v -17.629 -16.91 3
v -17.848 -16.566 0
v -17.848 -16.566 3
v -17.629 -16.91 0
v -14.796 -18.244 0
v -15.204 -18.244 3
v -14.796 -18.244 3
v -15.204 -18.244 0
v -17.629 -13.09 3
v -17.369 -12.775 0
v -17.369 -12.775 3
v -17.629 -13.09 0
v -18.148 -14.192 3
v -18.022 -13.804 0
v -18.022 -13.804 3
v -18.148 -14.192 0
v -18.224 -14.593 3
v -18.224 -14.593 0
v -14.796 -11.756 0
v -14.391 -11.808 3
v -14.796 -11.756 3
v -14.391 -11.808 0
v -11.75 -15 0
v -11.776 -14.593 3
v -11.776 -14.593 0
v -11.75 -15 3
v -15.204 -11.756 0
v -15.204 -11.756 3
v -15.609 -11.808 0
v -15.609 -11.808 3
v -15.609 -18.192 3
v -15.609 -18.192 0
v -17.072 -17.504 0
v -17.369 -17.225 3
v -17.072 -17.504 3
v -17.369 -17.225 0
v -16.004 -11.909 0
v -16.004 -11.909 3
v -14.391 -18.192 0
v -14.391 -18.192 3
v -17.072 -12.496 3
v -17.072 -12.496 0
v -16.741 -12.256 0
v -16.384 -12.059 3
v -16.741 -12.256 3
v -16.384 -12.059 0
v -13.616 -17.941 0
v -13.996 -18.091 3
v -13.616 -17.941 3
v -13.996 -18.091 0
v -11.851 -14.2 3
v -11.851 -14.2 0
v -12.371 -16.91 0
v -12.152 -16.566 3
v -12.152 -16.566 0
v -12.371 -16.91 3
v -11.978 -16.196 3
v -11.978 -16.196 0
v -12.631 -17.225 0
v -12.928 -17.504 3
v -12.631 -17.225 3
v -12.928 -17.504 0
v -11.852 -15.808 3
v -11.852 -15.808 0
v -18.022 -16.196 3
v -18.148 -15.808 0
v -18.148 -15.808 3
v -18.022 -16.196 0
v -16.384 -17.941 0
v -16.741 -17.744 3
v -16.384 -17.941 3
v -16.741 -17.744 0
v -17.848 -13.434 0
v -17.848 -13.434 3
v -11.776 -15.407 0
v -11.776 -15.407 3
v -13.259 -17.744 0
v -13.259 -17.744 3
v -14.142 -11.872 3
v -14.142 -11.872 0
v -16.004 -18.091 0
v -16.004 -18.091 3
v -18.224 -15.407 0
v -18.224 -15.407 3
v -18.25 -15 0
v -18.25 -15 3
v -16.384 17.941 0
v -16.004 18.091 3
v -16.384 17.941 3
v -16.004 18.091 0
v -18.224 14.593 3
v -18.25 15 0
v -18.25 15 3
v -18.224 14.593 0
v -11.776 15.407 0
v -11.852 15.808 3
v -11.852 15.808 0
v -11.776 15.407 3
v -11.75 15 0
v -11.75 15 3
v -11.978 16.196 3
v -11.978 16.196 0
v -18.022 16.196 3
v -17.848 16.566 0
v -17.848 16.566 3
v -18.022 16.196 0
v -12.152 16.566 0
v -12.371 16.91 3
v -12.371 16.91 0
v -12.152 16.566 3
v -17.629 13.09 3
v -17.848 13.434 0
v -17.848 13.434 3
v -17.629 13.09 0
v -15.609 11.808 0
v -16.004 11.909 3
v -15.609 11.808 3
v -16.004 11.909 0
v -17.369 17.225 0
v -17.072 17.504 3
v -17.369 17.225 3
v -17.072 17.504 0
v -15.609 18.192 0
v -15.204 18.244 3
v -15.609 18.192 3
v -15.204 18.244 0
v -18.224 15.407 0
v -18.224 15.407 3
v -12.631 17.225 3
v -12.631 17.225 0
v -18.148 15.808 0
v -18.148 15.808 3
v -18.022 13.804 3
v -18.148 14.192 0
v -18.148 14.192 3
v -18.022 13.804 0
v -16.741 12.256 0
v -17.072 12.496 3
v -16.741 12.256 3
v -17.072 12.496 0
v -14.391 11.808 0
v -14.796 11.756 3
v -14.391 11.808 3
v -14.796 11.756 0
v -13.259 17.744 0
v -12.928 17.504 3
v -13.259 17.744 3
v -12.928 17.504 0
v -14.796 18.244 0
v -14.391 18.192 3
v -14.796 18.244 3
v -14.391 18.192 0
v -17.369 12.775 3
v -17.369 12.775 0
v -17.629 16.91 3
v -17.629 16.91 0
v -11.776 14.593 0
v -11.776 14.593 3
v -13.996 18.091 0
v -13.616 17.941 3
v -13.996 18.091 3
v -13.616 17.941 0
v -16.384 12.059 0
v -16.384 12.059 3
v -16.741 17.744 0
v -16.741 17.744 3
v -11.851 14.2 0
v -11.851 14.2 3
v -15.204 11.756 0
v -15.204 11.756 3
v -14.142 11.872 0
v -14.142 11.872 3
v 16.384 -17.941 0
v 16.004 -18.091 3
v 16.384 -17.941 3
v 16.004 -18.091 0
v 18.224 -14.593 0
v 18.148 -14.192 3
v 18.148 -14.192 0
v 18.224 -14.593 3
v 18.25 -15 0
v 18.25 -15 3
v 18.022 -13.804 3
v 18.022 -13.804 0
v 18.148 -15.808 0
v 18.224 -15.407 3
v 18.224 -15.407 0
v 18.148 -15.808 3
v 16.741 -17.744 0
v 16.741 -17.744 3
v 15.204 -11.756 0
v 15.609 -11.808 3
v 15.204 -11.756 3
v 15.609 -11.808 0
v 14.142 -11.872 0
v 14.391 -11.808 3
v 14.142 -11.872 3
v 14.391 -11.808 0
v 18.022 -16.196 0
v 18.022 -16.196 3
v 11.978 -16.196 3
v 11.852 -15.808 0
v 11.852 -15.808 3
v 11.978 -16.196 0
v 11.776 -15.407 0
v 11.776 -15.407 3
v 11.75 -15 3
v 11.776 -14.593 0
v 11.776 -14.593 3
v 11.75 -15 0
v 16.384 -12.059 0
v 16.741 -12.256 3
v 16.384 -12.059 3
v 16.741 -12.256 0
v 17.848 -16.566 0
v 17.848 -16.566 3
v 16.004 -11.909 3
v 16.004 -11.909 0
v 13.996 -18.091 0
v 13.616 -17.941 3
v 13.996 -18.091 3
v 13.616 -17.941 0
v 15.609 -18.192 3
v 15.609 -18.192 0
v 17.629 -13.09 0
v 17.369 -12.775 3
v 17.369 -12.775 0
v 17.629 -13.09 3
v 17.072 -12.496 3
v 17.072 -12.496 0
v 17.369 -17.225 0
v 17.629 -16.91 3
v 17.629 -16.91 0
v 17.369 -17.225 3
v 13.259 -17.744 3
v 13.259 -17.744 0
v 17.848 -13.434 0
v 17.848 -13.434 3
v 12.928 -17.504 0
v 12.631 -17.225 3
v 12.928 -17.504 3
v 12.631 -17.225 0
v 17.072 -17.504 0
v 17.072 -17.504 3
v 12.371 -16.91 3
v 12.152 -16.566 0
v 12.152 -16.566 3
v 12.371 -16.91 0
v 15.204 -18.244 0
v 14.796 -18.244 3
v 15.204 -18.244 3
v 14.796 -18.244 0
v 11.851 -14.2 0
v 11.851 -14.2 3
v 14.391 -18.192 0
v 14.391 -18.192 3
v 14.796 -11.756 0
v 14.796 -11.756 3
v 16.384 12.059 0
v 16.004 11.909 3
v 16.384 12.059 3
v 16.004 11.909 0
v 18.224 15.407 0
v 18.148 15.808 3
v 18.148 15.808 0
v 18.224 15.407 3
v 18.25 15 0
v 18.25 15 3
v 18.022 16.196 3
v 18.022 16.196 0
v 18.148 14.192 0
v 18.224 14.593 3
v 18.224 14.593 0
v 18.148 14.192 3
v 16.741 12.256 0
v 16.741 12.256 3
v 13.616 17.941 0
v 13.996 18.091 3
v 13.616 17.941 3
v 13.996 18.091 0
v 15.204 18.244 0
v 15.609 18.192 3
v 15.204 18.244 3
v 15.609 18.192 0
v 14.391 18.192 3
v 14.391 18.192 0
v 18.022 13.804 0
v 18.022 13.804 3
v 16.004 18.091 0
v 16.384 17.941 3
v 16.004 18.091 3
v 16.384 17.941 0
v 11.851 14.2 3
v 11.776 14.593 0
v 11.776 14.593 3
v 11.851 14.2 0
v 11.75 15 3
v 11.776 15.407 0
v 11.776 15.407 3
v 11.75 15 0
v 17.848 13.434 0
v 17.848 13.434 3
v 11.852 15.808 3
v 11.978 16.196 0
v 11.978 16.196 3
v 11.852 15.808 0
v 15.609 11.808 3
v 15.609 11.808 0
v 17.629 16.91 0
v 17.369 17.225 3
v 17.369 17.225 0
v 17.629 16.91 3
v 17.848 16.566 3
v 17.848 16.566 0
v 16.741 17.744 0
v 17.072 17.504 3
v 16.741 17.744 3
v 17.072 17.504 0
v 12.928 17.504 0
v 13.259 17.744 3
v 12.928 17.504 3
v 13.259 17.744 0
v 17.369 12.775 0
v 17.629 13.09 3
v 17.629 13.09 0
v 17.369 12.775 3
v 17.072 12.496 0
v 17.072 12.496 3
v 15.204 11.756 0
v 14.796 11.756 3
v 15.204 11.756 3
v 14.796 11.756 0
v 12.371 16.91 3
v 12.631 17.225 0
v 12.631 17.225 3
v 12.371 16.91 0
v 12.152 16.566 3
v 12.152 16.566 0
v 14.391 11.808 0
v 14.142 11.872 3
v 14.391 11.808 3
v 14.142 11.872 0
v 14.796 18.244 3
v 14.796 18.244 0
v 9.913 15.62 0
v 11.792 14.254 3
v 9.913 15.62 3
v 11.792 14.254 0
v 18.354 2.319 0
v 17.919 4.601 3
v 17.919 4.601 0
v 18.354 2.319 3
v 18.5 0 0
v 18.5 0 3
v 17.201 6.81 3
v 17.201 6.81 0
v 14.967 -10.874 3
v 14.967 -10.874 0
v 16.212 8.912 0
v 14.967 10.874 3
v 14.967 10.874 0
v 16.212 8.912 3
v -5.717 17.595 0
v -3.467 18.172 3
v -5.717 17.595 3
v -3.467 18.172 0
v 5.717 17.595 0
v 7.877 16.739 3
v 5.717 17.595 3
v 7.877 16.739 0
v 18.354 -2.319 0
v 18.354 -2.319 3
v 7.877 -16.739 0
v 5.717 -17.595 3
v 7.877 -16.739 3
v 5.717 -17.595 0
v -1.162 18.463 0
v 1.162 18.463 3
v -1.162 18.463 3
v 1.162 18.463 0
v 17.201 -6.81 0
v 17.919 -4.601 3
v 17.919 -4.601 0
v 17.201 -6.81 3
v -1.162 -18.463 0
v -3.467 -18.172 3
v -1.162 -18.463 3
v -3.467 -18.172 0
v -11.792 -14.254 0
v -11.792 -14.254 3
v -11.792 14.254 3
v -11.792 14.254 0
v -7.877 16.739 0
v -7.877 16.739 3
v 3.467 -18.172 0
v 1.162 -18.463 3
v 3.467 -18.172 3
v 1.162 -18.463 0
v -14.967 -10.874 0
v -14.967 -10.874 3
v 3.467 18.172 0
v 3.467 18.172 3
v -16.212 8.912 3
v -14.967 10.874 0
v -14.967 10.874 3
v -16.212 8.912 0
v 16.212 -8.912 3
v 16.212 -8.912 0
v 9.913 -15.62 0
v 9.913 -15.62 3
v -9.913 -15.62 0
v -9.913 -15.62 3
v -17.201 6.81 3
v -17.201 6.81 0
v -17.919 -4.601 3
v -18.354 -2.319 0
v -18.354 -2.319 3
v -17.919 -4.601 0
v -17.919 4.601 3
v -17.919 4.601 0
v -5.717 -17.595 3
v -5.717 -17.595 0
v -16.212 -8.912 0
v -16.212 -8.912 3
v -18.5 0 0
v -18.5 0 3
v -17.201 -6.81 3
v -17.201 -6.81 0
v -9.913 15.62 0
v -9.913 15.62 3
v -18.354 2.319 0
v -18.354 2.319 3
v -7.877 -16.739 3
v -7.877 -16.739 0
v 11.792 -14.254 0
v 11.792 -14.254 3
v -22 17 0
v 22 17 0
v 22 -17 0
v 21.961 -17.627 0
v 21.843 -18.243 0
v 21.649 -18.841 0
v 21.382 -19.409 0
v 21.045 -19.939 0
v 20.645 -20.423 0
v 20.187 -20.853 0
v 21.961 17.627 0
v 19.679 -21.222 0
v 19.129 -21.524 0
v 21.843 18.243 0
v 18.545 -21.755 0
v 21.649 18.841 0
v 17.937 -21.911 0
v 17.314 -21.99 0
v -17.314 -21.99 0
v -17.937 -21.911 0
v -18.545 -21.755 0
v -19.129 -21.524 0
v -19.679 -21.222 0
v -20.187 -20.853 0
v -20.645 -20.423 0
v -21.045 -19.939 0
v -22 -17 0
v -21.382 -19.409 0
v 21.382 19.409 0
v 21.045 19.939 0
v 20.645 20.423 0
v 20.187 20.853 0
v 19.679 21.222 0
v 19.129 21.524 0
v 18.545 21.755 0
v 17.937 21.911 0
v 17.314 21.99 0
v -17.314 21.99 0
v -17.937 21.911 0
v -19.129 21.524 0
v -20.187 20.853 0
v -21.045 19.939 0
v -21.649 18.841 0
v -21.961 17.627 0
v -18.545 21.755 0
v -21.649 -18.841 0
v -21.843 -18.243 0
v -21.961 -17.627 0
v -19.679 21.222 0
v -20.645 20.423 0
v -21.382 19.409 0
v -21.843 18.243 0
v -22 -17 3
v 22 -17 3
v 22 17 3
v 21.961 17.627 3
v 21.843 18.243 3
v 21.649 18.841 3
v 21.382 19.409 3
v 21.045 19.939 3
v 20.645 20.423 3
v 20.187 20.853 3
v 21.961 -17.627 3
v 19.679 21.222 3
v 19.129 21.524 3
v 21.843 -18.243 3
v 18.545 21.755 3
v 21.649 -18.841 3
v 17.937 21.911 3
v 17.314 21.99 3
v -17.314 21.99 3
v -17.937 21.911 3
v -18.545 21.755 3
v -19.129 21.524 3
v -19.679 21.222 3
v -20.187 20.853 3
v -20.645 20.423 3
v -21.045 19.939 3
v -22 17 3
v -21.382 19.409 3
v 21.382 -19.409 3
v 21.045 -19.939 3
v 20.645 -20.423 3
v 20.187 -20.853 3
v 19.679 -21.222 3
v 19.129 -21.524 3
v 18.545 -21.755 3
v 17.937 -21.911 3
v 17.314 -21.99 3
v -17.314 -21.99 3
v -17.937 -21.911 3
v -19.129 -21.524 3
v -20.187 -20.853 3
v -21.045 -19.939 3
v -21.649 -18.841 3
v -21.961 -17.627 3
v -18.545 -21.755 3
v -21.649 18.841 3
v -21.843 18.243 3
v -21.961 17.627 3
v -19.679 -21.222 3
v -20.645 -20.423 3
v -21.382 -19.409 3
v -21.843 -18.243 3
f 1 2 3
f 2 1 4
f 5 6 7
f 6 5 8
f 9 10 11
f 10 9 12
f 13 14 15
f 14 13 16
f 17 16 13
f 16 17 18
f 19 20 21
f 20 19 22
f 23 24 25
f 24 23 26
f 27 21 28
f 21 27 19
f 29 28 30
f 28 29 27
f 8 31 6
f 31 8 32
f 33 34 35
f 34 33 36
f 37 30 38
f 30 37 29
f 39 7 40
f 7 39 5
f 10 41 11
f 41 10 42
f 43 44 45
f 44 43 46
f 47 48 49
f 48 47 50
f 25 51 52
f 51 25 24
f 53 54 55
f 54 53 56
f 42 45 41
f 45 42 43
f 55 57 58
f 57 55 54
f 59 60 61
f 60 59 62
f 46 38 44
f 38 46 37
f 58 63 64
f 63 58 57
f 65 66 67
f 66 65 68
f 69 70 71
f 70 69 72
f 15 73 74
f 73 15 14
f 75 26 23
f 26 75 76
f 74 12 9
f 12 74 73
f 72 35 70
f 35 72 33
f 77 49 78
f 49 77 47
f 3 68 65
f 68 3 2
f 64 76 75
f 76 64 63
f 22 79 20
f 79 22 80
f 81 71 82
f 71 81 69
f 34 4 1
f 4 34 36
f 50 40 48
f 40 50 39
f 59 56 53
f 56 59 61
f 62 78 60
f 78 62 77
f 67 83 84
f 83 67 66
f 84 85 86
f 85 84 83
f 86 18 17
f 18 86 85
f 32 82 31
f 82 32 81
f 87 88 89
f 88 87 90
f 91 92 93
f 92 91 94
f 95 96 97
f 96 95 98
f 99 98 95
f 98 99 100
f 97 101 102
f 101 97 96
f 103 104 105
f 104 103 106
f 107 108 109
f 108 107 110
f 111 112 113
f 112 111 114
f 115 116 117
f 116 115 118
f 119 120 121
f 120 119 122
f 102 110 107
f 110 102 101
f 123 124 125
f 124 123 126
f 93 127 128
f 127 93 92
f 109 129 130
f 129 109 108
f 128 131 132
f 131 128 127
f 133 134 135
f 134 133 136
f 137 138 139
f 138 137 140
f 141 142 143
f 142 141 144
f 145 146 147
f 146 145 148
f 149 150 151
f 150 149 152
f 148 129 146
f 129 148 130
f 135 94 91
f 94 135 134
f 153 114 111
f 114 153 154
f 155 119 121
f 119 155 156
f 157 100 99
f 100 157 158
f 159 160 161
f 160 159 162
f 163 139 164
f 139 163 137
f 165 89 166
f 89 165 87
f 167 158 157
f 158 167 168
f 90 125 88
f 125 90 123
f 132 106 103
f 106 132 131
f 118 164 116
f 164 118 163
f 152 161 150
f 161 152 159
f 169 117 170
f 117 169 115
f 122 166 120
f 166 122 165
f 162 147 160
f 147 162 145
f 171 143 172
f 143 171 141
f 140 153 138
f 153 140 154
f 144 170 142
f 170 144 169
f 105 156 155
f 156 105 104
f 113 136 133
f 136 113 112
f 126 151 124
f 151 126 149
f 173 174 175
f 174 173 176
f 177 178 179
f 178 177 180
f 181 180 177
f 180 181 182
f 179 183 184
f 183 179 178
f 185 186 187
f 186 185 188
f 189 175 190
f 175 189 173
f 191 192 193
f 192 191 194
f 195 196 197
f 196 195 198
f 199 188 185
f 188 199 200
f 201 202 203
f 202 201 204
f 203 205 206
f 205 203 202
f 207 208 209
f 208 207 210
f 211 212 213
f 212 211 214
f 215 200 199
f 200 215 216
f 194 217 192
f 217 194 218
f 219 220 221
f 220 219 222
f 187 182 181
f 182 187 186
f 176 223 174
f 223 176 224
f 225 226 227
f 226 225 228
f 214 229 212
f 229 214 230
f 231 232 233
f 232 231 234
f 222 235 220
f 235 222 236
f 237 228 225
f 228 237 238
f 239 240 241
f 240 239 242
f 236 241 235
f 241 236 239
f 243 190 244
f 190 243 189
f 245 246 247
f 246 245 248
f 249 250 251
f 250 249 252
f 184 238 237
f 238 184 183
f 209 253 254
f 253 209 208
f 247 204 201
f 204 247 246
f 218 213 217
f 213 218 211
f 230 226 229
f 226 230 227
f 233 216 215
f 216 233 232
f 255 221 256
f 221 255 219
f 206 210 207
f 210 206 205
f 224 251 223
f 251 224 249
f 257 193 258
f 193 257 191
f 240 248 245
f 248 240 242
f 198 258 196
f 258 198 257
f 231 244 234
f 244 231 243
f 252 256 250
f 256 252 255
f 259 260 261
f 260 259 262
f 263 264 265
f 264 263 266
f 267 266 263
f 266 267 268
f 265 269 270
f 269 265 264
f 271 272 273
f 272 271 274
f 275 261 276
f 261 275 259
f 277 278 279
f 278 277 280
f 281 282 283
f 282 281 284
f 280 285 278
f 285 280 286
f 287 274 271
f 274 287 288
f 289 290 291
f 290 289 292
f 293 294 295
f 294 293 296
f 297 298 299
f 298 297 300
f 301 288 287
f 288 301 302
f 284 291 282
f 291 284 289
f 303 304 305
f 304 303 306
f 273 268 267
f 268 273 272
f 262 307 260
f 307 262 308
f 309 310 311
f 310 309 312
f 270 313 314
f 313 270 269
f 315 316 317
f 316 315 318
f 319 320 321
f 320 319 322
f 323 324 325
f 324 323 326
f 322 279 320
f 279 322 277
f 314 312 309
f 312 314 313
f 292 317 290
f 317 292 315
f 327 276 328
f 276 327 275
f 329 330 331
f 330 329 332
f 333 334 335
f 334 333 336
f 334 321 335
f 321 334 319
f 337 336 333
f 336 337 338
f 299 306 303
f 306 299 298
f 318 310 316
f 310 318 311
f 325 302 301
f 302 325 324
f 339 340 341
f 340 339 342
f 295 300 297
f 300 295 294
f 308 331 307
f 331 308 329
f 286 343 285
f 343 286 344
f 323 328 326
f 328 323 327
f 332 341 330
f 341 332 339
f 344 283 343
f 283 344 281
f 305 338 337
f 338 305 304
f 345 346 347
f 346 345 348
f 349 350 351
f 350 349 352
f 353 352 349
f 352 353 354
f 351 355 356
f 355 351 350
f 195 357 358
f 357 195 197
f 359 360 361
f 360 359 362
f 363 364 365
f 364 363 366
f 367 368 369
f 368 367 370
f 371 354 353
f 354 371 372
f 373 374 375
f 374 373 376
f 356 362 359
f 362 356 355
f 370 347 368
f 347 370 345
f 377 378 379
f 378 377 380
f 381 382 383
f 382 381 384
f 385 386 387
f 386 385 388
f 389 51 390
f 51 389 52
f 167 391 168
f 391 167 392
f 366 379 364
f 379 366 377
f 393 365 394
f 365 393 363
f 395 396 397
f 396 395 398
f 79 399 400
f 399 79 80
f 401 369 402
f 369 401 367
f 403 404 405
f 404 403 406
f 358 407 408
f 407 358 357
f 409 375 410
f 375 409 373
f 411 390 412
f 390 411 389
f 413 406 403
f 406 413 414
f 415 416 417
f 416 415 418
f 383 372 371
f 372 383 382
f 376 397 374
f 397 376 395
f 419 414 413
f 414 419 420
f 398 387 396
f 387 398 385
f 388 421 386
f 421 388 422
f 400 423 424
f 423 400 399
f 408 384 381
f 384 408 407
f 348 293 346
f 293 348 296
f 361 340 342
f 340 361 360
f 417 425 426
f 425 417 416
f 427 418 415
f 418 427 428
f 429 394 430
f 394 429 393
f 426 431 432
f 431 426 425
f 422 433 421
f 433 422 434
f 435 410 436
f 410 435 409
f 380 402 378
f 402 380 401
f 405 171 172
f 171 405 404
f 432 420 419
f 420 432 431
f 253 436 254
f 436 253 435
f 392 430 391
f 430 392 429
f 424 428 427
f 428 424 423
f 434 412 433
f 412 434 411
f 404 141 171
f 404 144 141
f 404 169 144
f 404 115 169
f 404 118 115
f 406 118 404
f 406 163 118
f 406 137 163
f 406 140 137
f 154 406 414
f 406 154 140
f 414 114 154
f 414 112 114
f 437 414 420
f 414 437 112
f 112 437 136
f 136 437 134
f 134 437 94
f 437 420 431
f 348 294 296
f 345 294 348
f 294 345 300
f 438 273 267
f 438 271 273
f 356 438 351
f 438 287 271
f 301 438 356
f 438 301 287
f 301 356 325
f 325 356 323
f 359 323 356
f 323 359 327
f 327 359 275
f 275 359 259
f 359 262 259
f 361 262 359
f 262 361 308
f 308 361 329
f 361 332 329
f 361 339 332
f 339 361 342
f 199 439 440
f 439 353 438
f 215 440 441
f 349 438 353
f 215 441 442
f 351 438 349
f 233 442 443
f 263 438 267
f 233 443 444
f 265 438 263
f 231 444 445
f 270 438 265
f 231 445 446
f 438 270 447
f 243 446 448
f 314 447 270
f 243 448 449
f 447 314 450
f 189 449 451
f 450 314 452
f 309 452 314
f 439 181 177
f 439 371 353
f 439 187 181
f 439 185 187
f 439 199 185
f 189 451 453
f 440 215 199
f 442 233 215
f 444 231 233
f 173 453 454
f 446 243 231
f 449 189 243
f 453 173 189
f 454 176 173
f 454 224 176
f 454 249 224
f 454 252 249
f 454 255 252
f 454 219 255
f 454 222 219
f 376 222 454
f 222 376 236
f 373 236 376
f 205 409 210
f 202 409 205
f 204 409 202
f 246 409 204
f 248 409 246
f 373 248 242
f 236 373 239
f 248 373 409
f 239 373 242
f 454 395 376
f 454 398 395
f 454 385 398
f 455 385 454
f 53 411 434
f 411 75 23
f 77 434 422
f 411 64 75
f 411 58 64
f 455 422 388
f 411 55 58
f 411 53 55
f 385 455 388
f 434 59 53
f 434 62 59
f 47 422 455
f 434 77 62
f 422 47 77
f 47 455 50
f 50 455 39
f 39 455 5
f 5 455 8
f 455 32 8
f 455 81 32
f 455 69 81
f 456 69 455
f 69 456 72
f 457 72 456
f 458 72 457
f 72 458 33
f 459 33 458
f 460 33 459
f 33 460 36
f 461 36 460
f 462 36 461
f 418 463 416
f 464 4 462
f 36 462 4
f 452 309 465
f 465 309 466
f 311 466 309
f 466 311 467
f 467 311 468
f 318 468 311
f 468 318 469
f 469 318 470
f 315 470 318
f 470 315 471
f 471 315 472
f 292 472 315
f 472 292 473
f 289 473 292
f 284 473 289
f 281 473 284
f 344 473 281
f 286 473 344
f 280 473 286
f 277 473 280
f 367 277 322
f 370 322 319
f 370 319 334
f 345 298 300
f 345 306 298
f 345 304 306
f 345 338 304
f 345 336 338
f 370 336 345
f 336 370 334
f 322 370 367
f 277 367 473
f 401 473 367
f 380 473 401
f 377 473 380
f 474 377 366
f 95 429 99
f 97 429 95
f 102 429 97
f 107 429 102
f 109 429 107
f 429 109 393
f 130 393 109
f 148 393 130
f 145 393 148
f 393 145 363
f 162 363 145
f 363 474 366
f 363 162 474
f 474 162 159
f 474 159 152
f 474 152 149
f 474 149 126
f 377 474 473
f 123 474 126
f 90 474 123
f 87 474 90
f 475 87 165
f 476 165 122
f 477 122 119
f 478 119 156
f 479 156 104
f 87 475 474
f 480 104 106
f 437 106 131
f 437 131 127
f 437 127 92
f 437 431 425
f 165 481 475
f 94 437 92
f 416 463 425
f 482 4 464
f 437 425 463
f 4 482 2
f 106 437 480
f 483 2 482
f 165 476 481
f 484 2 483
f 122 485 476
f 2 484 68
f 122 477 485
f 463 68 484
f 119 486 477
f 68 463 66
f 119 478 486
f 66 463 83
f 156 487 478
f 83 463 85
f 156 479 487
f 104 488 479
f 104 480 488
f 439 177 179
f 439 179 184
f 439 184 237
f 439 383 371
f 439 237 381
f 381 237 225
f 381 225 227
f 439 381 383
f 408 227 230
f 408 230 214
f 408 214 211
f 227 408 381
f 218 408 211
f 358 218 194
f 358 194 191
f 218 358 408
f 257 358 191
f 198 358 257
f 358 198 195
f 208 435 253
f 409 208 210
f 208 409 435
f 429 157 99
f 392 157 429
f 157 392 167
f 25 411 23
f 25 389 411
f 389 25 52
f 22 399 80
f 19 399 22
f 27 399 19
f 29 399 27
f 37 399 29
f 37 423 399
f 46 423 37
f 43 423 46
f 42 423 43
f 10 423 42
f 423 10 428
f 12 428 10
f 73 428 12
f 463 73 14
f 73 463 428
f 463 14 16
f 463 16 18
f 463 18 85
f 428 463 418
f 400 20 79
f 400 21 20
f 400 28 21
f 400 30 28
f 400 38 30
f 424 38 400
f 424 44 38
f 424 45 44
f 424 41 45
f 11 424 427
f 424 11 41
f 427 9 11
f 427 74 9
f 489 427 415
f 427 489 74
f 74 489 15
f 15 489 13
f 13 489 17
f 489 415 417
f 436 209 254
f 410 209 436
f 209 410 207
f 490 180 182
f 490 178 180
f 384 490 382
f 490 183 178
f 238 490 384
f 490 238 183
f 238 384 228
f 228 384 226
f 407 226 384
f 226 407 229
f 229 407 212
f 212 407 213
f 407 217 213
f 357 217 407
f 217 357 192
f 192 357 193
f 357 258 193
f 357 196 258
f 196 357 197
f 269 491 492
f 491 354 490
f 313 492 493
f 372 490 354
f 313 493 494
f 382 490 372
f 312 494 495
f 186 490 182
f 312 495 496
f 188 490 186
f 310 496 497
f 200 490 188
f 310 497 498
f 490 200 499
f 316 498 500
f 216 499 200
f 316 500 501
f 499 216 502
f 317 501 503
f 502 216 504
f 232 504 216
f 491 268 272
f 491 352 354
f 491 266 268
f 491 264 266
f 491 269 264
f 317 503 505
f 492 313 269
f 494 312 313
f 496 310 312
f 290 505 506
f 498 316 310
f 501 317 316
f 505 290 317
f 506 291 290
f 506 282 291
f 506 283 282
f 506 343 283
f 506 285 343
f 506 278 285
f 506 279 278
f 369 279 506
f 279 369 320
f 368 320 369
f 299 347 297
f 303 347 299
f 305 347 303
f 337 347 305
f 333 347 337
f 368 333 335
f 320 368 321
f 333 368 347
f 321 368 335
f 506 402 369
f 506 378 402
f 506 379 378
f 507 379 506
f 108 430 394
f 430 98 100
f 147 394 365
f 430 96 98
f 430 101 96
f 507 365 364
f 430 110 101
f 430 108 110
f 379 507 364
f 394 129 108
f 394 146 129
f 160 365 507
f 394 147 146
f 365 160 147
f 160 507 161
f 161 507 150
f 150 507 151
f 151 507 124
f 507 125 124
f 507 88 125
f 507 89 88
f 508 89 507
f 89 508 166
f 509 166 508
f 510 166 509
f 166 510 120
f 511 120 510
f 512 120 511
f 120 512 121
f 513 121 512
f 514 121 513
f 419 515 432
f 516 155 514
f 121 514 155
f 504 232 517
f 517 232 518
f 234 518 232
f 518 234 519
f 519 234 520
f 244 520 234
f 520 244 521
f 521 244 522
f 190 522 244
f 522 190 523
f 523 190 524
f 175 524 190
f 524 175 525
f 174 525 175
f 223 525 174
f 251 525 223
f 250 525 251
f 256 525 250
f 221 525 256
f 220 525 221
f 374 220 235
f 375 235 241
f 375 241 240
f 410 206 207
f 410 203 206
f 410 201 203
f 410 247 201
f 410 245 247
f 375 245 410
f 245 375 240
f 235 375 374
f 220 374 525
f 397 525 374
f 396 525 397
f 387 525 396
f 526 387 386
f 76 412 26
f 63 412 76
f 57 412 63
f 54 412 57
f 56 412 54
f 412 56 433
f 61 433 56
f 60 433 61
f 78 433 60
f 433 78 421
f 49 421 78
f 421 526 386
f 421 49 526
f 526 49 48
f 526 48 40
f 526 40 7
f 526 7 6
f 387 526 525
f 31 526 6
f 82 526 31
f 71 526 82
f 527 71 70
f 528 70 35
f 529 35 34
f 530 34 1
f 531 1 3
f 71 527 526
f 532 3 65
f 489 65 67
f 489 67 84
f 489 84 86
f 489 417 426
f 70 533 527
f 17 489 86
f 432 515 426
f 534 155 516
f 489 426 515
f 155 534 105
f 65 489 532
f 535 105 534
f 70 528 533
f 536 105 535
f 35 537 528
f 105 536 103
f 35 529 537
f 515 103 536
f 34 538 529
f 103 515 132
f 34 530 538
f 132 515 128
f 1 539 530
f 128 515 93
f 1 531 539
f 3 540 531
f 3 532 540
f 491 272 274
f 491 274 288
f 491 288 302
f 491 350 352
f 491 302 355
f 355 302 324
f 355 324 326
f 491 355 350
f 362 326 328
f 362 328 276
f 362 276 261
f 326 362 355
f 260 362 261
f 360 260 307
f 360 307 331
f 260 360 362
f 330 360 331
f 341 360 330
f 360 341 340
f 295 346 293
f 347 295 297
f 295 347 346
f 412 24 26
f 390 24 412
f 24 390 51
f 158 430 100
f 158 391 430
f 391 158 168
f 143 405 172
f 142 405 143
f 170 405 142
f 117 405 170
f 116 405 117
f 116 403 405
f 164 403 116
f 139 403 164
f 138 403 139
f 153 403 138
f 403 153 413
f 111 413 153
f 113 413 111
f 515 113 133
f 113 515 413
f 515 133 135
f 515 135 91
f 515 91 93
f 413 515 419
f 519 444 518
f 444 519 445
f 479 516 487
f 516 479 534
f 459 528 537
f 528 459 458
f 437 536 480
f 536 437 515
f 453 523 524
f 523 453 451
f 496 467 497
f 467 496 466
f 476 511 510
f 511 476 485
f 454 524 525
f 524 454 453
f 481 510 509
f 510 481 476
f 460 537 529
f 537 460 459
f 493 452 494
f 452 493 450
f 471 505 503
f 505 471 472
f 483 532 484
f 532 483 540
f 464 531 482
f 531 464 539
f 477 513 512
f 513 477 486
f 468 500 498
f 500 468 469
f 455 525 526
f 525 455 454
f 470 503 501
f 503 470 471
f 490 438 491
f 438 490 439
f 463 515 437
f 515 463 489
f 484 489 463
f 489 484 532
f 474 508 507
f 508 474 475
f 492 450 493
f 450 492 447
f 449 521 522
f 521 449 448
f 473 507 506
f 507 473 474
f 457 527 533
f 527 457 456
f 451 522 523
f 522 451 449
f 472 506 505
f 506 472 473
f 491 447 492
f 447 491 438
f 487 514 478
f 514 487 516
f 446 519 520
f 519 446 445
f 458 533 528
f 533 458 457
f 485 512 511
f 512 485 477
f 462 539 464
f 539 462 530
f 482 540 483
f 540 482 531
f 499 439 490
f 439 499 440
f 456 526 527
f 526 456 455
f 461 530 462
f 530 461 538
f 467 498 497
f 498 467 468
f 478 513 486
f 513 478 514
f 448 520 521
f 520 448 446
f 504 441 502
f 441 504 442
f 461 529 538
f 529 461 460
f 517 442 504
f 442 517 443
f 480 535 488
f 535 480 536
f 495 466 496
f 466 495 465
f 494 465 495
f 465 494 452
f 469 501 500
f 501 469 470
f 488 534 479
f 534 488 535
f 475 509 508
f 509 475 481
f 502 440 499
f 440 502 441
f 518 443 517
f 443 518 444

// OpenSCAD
$fn = 50;


difference() {
	union() {
		hull() {
			translate(v = [-17.0000000000, 17.0000000000, 0]) {
				cylinder(h = 3, r = 5);
			}
			translate(v = [17.0000000000, 17.0000000000, 0]) {
				cylinder(h = 3, r = 5);
			}
			translate(v = [-17.0000000000, -17.0000000000, 0]) {
				cylinder(h = 3, r = 5);
			}
			translate(v = [17.0000000000, -17.0000000000, 0]) {
				cylinder(h = 3, r = 5);
			}
		}
	}
	union() {
		#translate(v = [-15.0000000000, -15.0000000000, -100.0000000000]) {
			cylinder(h = 200, r = 3.2500000000);
		}
		#translate(v = [-15.0000000000, 15.0000000000, -100.0000000000]) {
			cylinder(h = 200, r = 3.2500000000);
		}
		#translate(v = [15.0000000000, -15.0000000000, -100.0000000000]) {
			cylinder(h = 200, r = 3.2500000000);
		}
		#translate(v = [15.0000000000, 15.0000000000, -100.0000000000]) {
			cylinder(h = 200, r = 3.2500000000);
		}
		#cylinder(h = 3, r = 18.5000000000);
	}
}
